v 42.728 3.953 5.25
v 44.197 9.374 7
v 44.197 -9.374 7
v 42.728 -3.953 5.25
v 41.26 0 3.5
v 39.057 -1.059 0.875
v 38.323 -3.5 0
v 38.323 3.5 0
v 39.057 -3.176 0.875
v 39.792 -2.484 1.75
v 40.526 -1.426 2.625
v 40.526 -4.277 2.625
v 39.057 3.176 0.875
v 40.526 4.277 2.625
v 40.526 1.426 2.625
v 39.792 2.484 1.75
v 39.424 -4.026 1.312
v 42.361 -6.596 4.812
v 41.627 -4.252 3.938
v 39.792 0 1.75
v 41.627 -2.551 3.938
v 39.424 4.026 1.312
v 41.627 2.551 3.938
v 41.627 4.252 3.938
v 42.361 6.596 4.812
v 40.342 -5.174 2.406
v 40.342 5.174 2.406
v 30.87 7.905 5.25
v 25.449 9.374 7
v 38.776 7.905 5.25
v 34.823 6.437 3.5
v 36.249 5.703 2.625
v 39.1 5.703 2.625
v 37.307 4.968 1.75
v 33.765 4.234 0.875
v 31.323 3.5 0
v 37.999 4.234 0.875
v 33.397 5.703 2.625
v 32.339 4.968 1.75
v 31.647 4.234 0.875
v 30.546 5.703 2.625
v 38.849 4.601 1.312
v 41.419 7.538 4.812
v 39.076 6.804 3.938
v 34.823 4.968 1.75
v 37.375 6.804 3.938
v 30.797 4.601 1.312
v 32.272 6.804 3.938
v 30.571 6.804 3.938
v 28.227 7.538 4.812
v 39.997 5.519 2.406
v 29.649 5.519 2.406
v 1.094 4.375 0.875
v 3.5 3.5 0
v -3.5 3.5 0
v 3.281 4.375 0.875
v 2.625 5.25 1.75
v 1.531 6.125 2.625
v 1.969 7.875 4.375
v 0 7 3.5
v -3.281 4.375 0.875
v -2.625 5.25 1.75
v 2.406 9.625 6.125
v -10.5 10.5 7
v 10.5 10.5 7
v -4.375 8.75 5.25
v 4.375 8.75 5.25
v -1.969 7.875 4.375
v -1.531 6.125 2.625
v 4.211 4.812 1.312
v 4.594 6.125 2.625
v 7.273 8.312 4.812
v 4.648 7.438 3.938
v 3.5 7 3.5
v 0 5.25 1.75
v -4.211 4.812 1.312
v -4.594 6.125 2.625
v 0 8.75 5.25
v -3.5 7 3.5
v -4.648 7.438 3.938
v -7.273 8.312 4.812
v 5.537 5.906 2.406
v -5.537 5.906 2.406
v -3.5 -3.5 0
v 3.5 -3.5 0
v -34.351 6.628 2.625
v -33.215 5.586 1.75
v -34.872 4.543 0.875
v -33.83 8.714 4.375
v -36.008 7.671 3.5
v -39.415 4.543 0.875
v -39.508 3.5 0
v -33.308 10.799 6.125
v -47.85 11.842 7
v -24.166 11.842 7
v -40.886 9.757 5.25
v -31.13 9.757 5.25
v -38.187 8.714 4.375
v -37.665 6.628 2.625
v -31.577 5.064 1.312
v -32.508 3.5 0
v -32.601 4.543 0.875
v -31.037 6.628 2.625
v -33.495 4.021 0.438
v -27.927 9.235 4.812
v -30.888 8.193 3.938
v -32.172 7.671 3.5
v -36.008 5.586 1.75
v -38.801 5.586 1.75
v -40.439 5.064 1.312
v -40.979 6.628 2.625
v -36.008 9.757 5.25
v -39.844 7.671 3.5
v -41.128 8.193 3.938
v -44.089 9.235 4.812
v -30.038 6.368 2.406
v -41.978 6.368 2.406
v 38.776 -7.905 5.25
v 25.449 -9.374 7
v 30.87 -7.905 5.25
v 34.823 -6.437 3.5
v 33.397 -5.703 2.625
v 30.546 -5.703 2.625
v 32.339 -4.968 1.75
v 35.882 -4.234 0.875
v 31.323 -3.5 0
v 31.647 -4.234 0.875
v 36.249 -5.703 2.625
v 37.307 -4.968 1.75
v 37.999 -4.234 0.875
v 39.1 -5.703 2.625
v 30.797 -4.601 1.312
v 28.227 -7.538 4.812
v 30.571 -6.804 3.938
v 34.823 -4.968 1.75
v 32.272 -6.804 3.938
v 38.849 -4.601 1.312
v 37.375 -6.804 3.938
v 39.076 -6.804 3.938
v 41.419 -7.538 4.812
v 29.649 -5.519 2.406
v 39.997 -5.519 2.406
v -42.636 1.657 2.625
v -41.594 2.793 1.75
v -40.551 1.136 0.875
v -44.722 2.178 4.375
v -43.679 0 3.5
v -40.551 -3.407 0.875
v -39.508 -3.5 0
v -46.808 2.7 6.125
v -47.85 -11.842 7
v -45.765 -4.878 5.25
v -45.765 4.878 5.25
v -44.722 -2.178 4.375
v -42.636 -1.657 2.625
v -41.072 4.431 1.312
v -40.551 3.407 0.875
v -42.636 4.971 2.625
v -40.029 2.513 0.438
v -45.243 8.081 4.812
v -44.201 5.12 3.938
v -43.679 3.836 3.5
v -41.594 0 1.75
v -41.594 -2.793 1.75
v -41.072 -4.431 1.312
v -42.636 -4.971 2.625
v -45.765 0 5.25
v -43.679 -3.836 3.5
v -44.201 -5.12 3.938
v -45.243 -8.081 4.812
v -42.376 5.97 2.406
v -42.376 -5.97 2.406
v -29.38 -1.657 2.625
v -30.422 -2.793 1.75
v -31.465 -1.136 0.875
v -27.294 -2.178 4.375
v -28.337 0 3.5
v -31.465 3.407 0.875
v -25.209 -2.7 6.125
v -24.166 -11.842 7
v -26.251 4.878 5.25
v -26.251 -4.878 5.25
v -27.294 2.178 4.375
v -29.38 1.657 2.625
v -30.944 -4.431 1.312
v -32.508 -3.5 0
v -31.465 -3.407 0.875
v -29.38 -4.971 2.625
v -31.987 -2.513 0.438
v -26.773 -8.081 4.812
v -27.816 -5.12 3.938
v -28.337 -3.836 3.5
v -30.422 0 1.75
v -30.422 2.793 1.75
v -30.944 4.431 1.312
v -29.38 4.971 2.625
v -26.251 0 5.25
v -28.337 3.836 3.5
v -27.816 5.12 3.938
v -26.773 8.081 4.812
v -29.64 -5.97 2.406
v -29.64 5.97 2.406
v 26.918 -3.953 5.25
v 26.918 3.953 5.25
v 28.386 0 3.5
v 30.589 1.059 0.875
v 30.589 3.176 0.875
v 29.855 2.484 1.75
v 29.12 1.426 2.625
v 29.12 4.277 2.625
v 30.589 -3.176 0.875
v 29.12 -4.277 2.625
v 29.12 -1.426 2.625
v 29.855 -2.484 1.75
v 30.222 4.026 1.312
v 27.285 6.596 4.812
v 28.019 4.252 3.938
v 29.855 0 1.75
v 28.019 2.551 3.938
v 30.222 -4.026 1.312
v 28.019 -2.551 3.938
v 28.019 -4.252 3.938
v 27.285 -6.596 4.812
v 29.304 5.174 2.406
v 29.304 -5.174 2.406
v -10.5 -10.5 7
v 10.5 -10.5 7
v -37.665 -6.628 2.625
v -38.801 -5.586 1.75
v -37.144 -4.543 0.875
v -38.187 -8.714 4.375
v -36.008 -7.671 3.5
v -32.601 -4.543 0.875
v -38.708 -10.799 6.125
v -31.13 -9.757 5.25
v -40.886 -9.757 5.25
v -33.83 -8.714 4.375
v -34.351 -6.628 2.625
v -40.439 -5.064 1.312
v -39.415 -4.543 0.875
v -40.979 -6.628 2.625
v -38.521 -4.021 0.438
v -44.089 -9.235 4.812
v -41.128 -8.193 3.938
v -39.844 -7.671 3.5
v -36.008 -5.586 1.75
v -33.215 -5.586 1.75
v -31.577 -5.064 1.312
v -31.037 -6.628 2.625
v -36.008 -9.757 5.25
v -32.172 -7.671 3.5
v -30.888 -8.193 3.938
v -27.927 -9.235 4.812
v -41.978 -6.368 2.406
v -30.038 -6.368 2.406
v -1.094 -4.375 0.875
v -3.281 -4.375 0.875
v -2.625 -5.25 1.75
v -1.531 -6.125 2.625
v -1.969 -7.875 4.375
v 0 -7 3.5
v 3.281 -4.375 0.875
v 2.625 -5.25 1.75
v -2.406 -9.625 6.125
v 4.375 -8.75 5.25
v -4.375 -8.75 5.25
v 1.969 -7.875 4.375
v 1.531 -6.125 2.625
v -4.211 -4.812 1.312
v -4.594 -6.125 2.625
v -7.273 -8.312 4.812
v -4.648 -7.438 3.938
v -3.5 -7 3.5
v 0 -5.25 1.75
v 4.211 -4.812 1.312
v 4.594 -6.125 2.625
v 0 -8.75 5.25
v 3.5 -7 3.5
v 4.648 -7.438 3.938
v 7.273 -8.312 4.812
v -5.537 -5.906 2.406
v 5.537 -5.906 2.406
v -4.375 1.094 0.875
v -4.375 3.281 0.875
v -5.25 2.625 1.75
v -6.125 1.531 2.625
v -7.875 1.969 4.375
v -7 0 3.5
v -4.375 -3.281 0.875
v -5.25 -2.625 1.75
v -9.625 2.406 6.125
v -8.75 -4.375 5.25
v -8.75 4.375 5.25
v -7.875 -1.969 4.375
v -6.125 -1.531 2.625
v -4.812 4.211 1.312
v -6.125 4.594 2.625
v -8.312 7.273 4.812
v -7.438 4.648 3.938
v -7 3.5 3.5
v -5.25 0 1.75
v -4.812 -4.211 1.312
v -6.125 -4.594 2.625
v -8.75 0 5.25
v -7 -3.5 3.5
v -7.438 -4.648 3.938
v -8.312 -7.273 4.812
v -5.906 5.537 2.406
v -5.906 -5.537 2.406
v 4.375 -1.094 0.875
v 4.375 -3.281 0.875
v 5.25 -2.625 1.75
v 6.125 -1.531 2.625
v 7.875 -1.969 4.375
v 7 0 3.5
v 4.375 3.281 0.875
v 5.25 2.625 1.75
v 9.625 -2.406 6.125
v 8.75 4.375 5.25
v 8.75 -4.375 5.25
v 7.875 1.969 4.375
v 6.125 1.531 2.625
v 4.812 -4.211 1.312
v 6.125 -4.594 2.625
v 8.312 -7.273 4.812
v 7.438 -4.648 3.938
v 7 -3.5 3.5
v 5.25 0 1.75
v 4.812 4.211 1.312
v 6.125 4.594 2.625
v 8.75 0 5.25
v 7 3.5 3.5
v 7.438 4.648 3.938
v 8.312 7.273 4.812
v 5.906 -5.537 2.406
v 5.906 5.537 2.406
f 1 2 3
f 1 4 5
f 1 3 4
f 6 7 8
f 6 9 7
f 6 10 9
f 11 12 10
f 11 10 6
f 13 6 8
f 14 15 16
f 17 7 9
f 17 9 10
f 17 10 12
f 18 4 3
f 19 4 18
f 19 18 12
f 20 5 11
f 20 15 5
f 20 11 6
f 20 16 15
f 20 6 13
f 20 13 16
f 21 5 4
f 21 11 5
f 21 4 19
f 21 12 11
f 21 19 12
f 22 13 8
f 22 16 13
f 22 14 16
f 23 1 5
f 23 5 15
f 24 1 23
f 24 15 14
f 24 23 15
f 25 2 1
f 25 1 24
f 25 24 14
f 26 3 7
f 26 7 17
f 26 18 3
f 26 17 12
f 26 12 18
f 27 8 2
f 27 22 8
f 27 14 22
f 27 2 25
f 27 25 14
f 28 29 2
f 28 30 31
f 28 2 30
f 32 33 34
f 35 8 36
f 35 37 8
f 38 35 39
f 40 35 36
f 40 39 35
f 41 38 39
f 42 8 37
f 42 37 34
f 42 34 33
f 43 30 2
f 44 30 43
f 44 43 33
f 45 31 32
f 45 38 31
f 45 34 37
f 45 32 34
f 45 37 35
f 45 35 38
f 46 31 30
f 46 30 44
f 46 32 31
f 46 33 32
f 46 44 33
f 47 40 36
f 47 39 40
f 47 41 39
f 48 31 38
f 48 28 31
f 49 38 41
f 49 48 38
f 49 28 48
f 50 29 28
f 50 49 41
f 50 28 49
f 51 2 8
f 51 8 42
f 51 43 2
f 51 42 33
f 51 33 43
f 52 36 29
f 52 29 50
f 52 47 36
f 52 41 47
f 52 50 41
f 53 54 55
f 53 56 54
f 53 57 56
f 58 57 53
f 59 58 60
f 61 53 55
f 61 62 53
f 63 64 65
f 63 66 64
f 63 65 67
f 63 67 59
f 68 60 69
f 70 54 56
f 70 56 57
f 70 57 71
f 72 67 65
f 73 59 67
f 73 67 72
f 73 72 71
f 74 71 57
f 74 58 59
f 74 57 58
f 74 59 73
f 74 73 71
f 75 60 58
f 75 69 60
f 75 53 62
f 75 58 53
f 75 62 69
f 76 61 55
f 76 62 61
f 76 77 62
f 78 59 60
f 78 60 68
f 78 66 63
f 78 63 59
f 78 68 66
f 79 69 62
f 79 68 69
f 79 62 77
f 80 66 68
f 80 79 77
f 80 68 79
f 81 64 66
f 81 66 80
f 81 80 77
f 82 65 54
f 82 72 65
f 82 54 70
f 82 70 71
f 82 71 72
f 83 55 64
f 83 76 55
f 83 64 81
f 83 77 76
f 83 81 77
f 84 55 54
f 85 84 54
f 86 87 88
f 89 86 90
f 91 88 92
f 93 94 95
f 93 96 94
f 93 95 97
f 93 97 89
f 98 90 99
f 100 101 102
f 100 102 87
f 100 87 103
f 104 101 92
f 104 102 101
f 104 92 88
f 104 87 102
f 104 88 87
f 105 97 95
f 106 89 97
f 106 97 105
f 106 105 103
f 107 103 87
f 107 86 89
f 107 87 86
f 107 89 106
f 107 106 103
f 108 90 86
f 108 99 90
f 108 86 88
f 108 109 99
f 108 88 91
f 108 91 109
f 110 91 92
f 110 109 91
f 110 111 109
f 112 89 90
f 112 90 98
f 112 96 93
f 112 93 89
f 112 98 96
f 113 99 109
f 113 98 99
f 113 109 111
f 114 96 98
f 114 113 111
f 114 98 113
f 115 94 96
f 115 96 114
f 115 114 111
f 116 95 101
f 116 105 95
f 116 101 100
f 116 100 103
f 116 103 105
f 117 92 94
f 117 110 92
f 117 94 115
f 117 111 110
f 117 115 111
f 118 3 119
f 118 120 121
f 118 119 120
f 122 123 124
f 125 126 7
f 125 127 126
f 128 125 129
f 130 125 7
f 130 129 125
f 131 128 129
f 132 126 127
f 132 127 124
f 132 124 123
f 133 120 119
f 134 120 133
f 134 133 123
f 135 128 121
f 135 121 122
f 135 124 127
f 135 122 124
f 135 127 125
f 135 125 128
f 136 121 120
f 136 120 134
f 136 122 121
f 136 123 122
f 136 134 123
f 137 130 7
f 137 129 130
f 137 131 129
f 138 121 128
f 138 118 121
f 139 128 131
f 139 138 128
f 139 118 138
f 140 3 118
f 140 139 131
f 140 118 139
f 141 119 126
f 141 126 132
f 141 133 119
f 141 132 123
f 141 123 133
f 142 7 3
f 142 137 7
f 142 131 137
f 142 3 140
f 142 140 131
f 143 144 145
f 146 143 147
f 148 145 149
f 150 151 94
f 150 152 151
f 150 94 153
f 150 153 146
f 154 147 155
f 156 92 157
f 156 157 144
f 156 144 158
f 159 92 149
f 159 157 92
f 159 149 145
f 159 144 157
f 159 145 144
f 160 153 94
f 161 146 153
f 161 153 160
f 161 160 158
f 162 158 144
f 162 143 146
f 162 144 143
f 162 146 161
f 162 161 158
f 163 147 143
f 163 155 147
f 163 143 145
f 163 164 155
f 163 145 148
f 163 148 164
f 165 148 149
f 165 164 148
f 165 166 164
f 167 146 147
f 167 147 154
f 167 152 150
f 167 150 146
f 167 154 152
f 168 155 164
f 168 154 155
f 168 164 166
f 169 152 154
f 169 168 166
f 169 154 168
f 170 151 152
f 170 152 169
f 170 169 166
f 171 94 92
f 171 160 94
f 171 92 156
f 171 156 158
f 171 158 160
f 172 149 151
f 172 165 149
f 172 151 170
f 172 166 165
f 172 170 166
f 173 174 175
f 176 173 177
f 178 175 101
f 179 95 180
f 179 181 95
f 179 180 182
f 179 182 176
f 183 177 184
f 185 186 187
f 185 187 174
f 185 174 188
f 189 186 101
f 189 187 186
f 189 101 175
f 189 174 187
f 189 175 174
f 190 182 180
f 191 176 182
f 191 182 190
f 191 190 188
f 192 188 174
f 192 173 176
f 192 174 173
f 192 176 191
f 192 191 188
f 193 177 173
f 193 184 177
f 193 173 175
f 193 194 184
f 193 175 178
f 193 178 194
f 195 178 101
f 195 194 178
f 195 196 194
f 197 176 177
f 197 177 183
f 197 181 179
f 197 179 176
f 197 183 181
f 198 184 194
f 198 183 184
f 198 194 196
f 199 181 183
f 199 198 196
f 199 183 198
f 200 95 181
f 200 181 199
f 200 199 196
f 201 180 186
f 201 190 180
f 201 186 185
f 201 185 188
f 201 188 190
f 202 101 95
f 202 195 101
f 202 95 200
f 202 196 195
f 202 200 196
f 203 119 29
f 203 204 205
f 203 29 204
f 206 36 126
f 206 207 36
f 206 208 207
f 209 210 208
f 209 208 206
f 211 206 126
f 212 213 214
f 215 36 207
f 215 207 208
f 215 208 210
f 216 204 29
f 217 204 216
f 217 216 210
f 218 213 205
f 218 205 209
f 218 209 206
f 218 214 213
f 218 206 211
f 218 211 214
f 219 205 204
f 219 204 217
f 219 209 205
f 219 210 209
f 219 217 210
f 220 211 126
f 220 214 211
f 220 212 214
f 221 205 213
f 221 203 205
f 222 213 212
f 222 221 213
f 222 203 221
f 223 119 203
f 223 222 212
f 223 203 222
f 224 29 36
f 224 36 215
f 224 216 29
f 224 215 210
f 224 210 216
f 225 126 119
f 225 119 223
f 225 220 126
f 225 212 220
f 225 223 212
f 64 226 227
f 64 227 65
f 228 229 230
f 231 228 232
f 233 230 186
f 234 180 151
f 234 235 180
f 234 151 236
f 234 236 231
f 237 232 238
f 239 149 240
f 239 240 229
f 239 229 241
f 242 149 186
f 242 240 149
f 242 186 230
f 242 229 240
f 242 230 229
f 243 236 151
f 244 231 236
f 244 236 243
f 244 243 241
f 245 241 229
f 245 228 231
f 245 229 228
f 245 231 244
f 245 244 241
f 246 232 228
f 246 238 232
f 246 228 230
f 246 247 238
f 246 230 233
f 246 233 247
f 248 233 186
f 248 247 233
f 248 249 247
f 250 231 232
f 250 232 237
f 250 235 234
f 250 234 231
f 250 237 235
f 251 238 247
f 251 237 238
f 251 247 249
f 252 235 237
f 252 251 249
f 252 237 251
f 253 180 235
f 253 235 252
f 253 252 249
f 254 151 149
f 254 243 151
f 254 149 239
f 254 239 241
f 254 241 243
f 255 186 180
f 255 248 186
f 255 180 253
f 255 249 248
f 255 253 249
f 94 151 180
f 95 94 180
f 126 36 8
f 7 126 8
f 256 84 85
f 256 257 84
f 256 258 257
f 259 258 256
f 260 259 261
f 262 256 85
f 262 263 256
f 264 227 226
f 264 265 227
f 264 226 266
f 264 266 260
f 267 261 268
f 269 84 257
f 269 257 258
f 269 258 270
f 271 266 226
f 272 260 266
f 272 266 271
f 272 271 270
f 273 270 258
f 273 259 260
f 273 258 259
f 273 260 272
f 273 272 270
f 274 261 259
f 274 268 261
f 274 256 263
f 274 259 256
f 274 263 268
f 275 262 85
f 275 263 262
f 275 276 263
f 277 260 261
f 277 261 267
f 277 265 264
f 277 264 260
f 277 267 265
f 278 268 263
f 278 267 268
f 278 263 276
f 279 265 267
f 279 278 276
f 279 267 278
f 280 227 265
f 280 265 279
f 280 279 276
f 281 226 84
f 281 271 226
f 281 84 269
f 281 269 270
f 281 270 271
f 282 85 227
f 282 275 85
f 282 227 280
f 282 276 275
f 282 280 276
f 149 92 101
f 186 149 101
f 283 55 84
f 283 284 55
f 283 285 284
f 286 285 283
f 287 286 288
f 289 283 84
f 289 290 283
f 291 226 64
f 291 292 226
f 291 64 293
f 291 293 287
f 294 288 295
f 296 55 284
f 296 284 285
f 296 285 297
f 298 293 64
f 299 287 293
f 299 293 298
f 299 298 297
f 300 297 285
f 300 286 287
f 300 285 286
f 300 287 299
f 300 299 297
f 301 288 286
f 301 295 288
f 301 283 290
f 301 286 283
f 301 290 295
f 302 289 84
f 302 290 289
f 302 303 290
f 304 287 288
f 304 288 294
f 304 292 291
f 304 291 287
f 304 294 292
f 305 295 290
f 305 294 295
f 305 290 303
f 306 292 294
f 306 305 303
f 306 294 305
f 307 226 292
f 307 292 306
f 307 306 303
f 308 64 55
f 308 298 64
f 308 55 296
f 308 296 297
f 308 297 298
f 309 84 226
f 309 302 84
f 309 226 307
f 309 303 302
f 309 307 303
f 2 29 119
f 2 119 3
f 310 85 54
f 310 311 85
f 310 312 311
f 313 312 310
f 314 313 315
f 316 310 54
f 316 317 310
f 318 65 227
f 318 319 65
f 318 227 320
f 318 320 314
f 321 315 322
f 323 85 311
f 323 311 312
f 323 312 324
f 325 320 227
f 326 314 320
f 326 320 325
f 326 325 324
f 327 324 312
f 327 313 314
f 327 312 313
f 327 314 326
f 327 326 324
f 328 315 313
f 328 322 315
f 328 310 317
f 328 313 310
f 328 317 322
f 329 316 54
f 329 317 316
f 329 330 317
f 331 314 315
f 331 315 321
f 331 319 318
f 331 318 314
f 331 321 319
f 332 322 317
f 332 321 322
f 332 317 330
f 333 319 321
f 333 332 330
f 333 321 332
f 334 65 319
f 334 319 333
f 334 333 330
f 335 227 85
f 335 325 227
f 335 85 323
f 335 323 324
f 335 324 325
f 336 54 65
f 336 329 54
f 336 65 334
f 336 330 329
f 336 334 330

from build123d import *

# Parameters (mm, degrees)
F0_W     = 7
F0_H     = 7
F1_DEPTH = 7
F1_TAPER = -45
F2_W     = 7
F2_H     = 7
F3_DEPTH = 7
F3_TAPER = -50
F4_W     = 7
F4_H     = 7
F5_DEPTH = 7
F5_TAPER = -40


with BuildPart() as f1:
    # F0 (on Top) → F1 (new body)
    with BuildSketch(Plane.XY):
        Rectangle(F0_W, F0_H)
    extrude(amount=F1_DEPTH, taper=F1_TAPER)


with BuildPart() as f3:
    # F2 (on Top) → F3 (new body)
    with BuildSketch(Plane.XY):
        with Locations((-36.0080571588, 0)):
            Rectangle(F2_W, F2_H)
    extrude(amount=F3_DEPTH, taper=F3_TAPER)


with BuildPart() as f5:
    # F4 (on Top) → F5 (new body)
    with BuildSketch(Plane.XY):
        with Locations((34.8231363494, 0)):
            Rectangle(F4_W, F4_H)
    extrude(amount=F5_DEPTH, taper=F5_TAPER)


solid = Compound([f1.part, f3.part, f5.part])
